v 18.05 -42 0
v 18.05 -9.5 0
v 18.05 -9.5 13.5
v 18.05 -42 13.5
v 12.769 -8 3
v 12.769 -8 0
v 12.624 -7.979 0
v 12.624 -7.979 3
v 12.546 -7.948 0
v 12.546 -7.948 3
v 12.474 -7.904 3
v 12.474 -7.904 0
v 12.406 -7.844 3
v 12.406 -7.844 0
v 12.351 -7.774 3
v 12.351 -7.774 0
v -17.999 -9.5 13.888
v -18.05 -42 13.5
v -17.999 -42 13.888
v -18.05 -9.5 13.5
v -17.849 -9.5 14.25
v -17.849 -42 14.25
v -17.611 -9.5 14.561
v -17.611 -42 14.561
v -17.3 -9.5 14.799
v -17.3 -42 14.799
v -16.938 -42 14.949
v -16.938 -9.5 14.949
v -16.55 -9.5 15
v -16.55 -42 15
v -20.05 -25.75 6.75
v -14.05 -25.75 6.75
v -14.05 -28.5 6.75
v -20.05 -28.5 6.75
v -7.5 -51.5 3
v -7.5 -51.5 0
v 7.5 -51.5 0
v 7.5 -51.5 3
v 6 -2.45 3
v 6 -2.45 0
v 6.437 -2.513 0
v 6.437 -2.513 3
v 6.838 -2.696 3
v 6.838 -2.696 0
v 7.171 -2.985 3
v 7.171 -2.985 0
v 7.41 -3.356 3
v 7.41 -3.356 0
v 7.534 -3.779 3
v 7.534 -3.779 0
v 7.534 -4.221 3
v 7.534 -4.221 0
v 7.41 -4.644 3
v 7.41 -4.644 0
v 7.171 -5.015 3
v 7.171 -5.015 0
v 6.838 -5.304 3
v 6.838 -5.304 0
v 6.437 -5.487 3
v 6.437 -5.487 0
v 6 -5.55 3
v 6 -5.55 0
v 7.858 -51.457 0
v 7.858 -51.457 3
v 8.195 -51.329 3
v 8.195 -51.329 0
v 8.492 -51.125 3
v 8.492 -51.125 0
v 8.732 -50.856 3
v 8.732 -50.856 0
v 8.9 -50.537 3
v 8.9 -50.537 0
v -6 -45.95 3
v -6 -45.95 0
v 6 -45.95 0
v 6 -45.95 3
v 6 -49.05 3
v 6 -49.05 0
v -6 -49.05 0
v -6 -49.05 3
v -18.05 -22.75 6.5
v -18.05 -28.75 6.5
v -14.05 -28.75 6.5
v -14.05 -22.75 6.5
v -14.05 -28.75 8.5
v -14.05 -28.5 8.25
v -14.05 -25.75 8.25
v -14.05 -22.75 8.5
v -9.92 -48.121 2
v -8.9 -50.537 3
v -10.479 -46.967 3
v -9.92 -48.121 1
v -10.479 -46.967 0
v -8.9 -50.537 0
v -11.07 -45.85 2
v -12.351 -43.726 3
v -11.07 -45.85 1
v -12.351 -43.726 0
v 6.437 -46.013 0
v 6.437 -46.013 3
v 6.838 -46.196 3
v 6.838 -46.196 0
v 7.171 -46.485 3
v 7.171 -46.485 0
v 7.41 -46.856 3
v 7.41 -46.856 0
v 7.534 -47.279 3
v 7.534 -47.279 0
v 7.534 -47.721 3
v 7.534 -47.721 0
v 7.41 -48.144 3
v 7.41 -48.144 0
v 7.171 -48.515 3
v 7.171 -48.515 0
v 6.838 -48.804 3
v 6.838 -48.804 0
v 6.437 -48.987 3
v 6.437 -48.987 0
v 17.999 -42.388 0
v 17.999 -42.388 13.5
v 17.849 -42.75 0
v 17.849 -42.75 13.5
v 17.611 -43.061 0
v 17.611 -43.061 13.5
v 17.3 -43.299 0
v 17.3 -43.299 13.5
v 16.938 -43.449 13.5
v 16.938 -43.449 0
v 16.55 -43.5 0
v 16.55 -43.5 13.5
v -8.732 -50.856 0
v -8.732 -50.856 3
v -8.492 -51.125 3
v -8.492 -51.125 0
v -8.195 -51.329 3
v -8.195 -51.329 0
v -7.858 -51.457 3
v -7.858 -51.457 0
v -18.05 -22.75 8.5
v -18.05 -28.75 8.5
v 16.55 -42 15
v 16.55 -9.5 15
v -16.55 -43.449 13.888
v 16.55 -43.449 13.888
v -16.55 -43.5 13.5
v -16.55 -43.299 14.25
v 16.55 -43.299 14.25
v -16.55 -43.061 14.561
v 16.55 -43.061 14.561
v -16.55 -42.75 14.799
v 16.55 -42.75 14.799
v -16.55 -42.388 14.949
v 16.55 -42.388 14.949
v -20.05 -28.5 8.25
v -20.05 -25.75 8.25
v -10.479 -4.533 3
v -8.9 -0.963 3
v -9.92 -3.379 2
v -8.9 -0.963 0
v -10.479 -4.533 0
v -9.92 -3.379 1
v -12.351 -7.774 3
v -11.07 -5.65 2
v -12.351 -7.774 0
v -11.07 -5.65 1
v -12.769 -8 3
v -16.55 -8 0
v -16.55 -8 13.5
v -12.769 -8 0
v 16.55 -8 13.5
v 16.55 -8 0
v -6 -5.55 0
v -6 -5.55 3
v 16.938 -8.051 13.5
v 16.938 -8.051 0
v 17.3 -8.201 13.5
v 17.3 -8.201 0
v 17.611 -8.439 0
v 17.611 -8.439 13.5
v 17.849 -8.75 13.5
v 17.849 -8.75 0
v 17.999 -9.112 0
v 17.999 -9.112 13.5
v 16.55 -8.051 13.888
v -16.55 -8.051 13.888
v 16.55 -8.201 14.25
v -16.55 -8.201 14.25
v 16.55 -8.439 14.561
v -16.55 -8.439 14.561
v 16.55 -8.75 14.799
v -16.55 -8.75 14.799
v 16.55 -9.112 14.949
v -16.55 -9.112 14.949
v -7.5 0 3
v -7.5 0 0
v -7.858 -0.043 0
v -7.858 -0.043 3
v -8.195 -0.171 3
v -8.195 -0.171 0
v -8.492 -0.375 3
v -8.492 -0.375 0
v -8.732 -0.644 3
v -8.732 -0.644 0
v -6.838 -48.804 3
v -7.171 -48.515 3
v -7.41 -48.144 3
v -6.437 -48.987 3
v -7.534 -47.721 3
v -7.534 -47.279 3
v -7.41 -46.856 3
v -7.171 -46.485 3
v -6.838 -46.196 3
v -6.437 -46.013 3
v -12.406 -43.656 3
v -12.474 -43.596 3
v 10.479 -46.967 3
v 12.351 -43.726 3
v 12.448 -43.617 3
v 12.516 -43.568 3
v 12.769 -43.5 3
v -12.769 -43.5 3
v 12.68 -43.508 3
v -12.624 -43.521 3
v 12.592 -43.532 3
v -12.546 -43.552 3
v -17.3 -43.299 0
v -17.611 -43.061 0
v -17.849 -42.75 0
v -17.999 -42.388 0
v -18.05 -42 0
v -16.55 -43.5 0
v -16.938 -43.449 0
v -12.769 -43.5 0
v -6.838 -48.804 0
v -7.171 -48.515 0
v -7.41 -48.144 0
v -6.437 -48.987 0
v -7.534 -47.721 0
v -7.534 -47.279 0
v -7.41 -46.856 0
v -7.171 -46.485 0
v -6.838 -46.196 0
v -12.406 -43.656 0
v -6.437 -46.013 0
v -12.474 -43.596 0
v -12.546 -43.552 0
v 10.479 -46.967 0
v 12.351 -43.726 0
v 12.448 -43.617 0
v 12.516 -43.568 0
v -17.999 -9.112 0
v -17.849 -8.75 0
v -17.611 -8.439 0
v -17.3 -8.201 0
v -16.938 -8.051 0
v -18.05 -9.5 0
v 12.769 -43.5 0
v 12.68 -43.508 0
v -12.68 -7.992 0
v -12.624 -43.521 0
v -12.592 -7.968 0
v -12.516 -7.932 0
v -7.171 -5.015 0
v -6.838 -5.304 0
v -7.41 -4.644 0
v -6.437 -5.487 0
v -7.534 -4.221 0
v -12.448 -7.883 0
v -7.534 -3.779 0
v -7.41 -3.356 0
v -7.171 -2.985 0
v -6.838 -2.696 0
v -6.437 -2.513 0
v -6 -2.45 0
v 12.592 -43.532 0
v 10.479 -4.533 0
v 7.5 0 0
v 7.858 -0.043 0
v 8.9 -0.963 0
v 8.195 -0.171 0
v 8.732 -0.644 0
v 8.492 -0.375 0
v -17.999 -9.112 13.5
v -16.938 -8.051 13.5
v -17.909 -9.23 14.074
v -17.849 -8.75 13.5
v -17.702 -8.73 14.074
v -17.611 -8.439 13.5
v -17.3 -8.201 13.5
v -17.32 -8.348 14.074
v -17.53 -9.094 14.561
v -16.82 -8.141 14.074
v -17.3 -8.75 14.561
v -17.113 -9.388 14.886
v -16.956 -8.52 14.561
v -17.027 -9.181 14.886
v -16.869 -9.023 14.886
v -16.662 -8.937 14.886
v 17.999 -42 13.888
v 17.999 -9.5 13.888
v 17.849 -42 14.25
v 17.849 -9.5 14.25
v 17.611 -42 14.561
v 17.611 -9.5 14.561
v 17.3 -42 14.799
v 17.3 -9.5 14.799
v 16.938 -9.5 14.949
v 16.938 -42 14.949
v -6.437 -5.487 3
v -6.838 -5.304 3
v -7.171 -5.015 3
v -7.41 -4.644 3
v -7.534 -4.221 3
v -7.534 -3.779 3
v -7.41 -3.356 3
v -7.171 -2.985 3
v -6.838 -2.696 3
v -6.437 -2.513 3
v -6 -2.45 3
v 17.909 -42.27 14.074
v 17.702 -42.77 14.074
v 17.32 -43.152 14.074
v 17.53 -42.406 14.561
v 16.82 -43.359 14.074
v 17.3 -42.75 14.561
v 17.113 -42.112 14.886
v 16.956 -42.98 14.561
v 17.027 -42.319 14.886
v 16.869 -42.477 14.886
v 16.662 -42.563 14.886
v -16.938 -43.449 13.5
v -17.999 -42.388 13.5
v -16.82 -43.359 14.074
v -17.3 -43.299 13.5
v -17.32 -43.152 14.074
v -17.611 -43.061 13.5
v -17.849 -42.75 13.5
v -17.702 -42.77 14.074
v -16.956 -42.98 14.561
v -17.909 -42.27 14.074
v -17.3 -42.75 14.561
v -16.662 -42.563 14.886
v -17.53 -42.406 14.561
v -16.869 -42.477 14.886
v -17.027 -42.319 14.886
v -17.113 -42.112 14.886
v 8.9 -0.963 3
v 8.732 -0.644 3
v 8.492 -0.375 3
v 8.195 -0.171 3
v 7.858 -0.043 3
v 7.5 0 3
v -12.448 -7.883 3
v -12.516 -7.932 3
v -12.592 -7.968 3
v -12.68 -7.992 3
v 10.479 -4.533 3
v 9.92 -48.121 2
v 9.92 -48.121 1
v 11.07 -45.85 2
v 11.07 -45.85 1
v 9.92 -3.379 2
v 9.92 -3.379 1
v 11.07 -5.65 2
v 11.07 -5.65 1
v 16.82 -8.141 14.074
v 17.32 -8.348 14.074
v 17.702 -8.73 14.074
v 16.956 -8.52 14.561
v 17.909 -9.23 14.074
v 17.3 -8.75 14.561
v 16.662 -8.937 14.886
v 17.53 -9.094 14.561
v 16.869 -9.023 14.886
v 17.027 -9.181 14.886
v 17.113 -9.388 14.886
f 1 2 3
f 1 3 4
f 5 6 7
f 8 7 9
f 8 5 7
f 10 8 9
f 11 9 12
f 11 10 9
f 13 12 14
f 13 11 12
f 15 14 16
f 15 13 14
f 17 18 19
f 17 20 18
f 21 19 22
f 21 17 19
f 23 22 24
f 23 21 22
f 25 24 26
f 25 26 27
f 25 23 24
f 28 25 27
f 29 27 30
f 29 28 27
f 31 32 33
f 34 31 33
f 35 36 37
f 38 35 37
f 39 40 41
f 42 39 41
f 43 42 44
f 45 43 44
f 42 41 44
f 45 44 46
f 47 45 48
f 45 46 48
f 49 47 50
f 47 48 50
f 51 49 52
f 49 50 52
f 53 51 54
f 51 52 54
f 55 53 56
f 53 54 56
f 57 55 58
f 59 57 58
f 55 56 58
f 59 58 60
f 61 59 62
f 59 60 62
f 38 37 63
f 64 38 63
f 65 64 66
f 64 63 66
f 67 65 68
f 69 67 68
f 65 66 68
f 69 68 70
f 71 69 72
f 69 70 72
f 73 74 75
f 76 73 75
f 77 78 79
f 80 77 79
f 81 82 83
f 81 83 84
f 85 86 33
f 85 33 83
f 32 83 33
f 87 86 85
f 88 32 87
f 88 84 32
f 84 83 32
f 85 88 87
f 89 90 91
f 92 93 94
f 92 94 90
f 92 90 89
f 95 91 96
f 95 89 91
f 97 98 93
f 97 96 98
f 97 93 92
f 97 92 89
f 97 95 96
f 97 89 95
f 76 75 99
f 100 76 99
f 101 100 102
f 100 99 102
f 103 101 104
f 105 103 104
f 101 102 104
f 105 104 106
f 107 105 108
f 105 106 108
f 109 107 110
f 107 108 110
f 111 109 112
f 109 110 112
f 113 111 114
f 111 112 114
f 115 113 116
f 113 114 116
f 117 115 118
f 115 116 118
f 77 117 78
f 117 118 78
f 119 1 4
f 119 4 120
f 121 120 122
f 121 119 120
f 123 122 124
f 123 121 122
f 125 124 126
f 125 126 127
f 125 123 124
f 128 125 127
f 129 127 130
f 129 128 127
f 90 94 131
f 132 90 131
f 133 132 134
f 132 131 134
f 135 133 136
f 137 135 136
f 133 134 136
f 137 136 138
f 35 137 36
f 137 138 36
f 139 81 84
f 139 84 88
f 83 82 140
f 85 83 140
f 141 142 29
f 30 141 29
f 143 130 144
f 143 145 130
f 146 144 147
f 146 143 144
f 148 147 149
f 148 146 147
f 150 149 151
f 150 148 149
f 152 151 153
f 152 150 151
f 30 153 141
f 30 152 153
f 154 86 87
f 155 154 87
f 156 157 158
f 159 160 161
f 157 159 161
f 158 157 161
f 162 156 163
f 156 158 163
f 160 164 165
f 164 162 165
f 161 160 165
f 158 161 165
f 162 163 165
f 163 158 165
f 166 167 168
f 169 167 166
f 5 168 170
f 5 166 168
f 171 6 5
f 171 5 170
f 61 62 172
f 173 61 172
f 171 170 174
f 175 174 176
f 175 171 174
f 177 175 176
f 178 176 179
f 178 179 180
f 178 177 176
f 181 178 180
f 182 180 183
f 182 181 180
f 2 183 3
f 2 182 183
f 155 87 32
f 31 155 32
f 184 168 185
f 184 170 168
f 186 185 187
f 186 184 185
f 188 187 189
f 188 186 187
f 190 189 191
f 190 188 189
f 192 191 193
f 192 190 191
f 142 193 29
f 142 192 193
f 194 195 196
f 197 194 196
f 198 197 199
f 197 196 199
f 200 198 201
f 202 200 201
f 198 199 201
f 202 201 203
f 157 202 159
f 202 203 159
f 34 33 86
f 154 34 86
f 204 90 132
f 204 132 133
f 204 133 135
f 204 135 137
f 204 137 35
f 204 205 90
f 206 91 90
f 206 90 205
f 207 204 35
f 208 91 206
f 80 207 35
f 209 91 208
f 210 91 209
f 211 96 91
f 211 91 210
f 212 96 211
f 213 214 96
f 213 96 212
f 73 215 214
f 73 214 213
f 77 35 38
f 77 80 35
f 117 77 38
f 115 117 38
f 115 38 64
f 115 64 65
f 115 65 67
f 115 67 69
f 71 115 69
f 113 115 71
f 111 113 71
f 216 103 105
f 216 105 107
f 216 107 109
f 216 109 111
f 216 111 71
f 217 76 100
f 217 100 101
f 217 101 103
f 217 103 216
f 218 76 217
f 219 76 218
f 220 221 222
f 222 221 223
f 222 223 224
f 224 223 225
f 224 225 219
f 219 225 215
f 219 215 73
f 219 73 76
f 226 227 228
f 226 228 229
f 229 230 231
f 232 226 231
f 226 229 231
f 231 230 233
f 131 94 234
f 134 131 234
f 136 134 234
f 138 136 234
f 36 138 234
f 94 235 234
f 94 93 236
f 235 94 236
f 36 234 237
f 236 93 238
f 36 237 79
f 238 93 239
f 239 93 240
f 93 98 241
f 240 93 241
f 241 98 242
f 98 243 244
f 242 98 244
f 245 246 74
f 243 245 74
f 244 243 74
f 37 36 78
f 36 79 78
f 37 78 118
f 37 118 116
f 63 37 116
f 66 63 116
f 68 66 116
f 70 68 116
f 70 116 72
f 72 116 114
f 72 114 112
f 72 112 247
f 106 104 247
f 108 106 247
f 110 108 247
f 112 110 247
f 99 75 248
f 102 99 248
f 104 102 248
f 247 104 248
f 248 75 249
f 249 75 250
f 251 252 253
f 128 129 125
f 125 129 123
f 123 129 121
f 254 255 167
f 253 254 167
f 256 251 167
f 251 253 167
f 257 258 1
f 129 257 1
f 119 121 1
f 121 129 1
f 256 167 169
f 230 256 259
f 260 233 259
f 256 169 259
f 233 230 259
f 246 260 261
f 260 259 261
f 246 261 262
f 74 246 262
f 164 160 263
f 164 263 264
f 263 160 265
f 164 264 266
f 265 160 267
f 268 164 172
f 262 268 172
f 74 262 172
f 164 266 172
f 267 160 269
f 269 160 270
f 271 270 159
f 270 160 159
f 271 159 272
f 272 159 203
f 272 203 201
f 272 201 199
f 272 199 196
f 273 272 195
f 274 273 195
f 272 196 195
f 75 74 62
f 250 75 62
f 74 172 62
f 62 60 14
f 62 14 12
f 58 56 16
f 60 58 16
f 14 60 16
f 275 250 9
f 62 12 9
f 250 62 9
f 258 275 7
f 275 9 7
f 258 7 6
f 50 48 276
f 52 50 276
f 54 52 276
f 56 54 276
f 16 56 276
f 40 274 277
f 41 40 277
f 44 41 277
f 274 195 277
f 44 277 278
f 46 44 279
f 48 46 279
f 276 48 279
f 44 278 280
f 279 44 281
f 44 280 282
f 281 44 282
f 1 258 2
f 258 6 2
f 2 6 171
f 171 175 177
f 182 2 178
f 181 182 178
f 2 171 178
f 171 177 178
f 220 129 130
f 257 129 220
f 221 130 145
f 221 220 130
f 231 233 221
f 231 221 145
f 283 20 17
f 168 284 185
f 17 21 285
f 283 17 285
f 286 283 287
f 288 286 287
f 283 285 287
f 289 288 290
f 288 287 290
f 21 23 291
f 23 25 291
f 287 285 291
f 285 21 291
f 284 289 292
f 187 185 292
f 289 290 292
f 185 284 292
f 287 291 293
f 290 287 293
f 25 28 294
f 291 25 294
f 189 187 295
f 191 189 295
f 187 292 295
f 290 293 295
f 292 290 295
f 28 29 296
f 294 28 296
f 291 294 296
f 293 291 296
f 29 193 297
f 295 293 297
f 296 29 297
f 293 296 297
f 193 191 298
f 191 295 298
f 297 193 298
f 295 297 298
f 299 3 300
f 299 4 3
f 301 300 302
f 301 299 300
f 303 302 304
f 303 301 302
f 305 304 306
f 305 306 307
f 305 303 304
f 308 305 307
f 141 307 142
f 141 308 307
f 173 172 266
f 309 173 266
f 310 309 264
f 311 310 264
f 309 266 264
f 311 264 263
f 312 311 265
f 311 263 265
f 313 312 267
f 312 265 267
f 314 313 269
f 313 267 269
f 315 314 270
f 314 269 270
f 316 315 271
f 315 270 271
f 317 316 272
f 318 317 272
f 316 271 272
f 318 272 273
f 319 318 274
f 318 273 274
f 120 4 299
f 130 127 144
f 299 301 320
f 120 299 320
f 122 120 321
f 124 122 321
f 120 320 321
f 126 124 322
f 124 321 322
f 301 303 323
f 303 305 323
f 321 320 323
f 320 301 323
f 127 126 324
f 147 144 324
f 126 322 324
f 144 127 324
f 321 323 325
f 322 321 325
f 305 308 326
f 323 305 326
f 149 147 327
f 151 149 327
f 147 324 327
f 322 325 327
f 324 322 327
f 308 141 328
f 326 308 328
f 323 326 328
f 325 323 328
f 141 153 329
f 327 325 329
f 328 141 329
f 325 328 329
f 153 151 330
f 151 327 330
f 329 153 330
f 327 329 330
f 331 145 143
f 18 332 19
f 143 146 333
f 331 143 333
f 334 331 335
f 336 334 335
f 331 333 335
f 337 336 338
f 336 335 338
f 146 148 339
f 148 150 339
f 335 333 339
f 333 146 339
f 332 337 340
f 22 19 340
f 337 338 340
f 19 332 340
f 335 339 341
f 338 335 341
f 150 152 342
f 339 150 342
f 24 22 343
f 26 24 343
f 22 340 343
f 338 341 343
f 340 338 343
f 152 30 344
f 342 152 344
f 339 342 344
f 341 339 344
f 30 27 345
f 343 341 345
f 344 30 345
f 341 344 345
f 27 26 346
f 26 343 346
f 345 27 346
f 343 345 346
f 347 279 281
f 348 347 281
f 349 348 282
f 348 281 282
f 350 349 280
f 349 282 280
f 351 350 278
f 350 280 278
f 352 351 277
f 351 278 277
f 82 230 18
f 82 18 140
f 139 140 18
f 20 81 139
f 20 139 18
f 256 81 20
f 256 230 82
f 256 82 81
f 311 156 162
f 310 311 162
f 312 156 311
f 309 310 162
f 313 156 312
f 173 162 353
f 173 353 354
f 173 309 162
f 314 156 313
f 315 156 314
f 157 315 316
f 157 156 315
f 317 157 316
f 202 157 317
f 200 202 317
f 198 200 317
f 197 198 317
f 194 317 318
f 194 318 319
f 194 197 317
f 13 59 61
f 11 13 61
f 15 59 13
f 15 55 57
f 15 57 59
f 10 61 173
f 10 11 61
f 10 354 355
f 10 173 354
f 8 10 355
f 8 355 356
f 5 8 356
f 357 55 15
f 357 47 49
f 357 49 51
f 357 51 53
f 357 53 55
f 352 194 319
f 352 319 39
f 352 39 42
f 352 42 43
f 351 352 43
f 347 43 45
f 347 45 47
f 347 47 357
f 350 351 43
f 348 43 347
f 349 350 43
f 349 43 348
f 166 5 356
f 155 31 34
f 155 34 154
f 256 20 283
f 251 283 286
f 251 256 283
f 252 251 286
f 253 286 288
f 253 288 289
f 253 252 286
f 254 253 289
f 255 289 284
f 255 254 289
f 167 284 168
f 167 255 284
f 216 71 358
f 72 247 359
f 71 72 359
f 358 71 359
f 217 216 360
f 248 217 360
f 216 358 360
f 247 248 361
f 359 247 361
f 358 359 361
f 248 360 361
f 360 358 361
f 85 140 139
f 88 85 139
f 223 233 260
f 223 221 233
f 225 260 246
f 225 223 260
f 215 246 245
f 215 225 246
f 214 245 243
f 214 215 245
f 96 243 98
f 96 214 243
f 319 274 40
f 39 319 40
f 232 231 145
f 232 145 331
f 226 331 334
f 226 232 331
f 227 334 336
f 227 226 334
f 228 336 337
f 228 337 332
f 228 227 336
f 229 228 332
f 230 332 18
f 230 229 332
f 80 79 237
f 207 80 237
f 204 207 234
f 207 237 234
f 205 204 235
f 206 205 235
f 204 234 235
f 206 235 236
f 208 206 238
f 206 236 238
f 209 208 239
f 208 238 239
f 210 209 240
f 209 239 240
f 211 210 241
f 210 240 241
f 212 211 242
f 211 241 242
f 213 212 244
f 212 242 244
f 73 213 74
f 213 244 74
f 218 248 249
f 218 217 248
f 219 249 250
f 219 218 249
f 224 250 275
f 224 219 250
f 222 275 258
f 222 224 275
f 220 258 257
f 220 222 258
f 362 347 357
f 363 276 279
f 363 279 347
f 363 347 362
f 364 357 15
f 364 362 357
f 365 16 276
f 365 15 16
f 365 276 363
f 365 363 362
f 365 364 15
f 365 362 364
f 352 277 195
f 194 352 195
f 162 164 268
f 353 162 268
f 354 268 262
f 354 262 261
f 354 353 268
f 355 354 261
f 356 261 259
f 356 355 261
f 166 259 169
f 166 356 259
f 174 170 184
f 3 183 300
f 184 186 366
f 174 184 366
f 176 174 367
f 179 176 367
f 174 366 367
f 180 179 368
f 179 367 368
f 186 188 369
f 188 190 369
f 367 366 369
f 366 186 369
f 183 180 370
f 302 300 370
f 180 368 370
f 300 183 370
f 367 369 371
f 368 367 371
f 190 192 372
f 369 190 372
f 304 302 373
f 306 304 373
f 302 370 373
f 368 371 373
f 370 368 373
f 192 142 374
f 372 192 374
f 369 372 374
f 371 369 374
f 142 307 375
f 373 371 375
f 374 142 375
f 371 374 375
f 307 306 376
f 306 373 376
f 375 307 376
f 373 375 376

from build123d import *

# Parameters (mm, degrees)
EXTRUDE_1_DEPTH      = 3
FILLET_1_R           = 0.5
EXTRUDE_2_DEPTH      = 12
FILLET_2_R           = 1.5
CUT_EXTRUDE_1_DEPTH  = 4
EXTRUDE_3_DEPTH      = 2
EXTRUDE_3_DEPTH_BACK = 4


with BuildPart() as part:
    # 草图2 → 凸台-拉伸1 (new body)
    with BuildSketch(Plane.XY):
        with BuildLine():
            ThreePointArc((-7.5, 0), (-8.349754016, -0.263910152), (-8.900496416, -0.96277585))
            add(Edge.make_bspline(
                [(-8.900496416, -0.96277585), (-9.890641619, -3.543997872), (-11.090476147, -5.889739255), (-12.5, -8)],
                knots=[0.057327247, 0.057327247, 0.057327247, 0.057327247, 0.826256539, 0.826256539, 0.826256539, 0.826256539], degree=3))
            Line((-12.5, -8), (-16.55, -8))
            ThreePointArc((-16.55, -8), (-17.610660172, -8.439339828), (-18.05, -9.5))
            Line((-18.05, -9.5), (-18.05, -42))
            ThreePointArc((-18.05, -42), (-17.610660172, -43.060660172), (-16.55, -43.5))
            Line((-16.55, -43.5), (-12.5, -43.5))
            add(Edge.make_bspline(
                [(-8.900496416, -50.53722415), (-9.890641619, -47.956002128), (-11.090476147, -45.610260745), (-12.5, -43.5)],
                knots=[0.057327247, 0.057327247, 0.057327247, 0.057327247, 0.826256539, 0.826256539, 0.826256539, 0.826256539], degree=3))
            ThreePointArc((-8.900496416, -50.53722415), (-8.349754016, -51.236089848), (-7.5, -51.5))
            Line((-7.5, -51.5), (7.5, -51.5))
            ThreePointArc((7.5, -51.5), (8.349754016, -51.236089848), (8.900496416, -50.53722415))
            add(Edge.make_bspline(
                [(8.900496416, -50.53722415), (9.890641619, -47.956002128), (11.090476147, -45.610260745), (12.5, -43.5)],
                knots=[0.057327247, 0.057327247, 0.057327247, 0.057327247, 0.826256539, 0.826256539, 0.826256539, 0.826256539], degree=3))
            Line((12.5, -43.5), (16.55, -43.5))
            ThreePointArc((16.55, -43.5), (17.610660172, -43.060660172), (18.05, -42))
            Line((18.05, -42), (18.05, -9.5))
            ThreePointArc((18.05, -9.5), (17.610660172, -8.439339828), (16.55, -8))
            Line((16.55, -8), (12.5, -8))
            add(Edge.make_bspline(
                [(8.900496416, -0.96277585), (9.890641619, -3.543997872), (11.090476147, -5.889739255), (12.5, -8)],
                knots=[0.057327247, 0.057327247, 0.057327247, 0.057327247, 0.826256539, 0.826256539, 0.826256539, 0.826256539], degree=3))
            ThreePointArc((8.900496416, -0.96277585), (8.349754016, -0.263910152), (7.5, 0))
            Line((7.5, 0), (-7.5, 0))
        make_face()
        with BuildLine():
            Line((-6, -2.45), (6, -2.45))
            ThreePointArc((6, -2.45), (7.55, -4), (6, -5.55))
            Line((6, -5.55), (-6, -5.55))
            ThreePointArc((-6, -5.55), (-7.55, -4), (-6, -2.45))
        make_face(mode=Mode.SUBTRACT)
        with BuildLine():
            Line((-6, -45.95), (6, -45.95))
            ThreePointArc((6, -45.95), (7.55, -47.5), (6, -49.05))
            Line((6, -49.05), (-6, -49.05))
            ThreePointArc((-6, -49.05), (-7.55, -47.5), (-6, -45.95))
        make_face(mode=Mode.SUBTRACT)
    extrude(amount=EXTRUDE_1_DEPTH)

    # 圆角1
    fillet_1_edges = [part.edges().sort_by_distance(p)[0] for p in [
        (12.5, -43.5, 1.5),
        (-12.5, -43.5, 1.5),
        (-12.5, -8, 1.5),
        (12.5, -8, 1.5),
    ]]
    fillet(fillet_1_edges, radius=FILLET_1_R)

    # 草图3 → 凸台-拉伸2 (add)
    with BuildSketch(Plane.XY.offset(3)):
        with BuildLine():
            Line((0, -8), (16.55, -8))
            ThreePointArc((16.55, -8), (17.610660172, -8.439339828), (18.05, -9.5))
            Line((18.05, -9.5), (18.05, -42))
            ThreePointArc((18.05, -42), (17.610660172, -43.060660172), (16.55, -43.5))
            Line((16.55, -43.5), (14.659338555, -43.5))
            Line((14.659338555, -43.5), (-16.55, -43.5))
            ThreePointArc((-16.55, -43.5), (-17.610660172, -43.060660172), (-18.05, -42))
            Line((-18.05, -42), (-18.05, -25.75))
            Line((-18.05, -25.75), (-18.05, -9.5))
            ThreePointArc((-18.05, -9.5), (-17.610660172, -8.439339828), (-16.55, -8))
            Line((-16.55, -8), (0, -8))
        make_face()
    extrude(amount=EXTRUDE_2_DEPTH)

    # 圆角2
    fillet_2_edges = [part.edges().sort_by_distance(p)[0] for p in [
        (17.610660172, -8.439339828, 15),
        (18.05, -25.75, 15),
        (17.610660172, -43.060660172, 15),
        (0, -43.5, 15),
        (-17.610660172, -43.060660172, 15),
        (-18.05, -25.75, 15),
        (-17.610660172, -8.439339828, 15),
        (0, -8, 15),
    ]]
    fillet(fillet_2_edges, radius=FILLET_2_R)

    # 草图4 → 切除-拉伸1 (cut)
    with BuildSketch(Plane.ZY.offset(18.05)):
        Polygon((8.5, -28.75), (8.5, -25.75), (8.5, -22.75), (6.5, -22.75), (6.5, -28.75), align=None)
    extrude(amount=-CUT_EXTRUDE_1_DEPTH, mode=Mode.SUBTRACT)

    # 草图4<3> → 凸台-拉伸3 (add, two sides: drawn at the far end of the back side and taken through both)
    with BuildSketch(Plane.ZY.offset(18.05).offset(-EXTRUDE_3_DEPTH_BACK)):
        Polygon((8.25, -28.5), (8.25, -25.75), (7.5, -25.75), (6.75, -25.75), (6.75, -28.5), align=None)
    extrude(amount=EXTRUDE_3_DEPTH + EXTRUDE_3_DEPTH_BACK)


solid = part.part
